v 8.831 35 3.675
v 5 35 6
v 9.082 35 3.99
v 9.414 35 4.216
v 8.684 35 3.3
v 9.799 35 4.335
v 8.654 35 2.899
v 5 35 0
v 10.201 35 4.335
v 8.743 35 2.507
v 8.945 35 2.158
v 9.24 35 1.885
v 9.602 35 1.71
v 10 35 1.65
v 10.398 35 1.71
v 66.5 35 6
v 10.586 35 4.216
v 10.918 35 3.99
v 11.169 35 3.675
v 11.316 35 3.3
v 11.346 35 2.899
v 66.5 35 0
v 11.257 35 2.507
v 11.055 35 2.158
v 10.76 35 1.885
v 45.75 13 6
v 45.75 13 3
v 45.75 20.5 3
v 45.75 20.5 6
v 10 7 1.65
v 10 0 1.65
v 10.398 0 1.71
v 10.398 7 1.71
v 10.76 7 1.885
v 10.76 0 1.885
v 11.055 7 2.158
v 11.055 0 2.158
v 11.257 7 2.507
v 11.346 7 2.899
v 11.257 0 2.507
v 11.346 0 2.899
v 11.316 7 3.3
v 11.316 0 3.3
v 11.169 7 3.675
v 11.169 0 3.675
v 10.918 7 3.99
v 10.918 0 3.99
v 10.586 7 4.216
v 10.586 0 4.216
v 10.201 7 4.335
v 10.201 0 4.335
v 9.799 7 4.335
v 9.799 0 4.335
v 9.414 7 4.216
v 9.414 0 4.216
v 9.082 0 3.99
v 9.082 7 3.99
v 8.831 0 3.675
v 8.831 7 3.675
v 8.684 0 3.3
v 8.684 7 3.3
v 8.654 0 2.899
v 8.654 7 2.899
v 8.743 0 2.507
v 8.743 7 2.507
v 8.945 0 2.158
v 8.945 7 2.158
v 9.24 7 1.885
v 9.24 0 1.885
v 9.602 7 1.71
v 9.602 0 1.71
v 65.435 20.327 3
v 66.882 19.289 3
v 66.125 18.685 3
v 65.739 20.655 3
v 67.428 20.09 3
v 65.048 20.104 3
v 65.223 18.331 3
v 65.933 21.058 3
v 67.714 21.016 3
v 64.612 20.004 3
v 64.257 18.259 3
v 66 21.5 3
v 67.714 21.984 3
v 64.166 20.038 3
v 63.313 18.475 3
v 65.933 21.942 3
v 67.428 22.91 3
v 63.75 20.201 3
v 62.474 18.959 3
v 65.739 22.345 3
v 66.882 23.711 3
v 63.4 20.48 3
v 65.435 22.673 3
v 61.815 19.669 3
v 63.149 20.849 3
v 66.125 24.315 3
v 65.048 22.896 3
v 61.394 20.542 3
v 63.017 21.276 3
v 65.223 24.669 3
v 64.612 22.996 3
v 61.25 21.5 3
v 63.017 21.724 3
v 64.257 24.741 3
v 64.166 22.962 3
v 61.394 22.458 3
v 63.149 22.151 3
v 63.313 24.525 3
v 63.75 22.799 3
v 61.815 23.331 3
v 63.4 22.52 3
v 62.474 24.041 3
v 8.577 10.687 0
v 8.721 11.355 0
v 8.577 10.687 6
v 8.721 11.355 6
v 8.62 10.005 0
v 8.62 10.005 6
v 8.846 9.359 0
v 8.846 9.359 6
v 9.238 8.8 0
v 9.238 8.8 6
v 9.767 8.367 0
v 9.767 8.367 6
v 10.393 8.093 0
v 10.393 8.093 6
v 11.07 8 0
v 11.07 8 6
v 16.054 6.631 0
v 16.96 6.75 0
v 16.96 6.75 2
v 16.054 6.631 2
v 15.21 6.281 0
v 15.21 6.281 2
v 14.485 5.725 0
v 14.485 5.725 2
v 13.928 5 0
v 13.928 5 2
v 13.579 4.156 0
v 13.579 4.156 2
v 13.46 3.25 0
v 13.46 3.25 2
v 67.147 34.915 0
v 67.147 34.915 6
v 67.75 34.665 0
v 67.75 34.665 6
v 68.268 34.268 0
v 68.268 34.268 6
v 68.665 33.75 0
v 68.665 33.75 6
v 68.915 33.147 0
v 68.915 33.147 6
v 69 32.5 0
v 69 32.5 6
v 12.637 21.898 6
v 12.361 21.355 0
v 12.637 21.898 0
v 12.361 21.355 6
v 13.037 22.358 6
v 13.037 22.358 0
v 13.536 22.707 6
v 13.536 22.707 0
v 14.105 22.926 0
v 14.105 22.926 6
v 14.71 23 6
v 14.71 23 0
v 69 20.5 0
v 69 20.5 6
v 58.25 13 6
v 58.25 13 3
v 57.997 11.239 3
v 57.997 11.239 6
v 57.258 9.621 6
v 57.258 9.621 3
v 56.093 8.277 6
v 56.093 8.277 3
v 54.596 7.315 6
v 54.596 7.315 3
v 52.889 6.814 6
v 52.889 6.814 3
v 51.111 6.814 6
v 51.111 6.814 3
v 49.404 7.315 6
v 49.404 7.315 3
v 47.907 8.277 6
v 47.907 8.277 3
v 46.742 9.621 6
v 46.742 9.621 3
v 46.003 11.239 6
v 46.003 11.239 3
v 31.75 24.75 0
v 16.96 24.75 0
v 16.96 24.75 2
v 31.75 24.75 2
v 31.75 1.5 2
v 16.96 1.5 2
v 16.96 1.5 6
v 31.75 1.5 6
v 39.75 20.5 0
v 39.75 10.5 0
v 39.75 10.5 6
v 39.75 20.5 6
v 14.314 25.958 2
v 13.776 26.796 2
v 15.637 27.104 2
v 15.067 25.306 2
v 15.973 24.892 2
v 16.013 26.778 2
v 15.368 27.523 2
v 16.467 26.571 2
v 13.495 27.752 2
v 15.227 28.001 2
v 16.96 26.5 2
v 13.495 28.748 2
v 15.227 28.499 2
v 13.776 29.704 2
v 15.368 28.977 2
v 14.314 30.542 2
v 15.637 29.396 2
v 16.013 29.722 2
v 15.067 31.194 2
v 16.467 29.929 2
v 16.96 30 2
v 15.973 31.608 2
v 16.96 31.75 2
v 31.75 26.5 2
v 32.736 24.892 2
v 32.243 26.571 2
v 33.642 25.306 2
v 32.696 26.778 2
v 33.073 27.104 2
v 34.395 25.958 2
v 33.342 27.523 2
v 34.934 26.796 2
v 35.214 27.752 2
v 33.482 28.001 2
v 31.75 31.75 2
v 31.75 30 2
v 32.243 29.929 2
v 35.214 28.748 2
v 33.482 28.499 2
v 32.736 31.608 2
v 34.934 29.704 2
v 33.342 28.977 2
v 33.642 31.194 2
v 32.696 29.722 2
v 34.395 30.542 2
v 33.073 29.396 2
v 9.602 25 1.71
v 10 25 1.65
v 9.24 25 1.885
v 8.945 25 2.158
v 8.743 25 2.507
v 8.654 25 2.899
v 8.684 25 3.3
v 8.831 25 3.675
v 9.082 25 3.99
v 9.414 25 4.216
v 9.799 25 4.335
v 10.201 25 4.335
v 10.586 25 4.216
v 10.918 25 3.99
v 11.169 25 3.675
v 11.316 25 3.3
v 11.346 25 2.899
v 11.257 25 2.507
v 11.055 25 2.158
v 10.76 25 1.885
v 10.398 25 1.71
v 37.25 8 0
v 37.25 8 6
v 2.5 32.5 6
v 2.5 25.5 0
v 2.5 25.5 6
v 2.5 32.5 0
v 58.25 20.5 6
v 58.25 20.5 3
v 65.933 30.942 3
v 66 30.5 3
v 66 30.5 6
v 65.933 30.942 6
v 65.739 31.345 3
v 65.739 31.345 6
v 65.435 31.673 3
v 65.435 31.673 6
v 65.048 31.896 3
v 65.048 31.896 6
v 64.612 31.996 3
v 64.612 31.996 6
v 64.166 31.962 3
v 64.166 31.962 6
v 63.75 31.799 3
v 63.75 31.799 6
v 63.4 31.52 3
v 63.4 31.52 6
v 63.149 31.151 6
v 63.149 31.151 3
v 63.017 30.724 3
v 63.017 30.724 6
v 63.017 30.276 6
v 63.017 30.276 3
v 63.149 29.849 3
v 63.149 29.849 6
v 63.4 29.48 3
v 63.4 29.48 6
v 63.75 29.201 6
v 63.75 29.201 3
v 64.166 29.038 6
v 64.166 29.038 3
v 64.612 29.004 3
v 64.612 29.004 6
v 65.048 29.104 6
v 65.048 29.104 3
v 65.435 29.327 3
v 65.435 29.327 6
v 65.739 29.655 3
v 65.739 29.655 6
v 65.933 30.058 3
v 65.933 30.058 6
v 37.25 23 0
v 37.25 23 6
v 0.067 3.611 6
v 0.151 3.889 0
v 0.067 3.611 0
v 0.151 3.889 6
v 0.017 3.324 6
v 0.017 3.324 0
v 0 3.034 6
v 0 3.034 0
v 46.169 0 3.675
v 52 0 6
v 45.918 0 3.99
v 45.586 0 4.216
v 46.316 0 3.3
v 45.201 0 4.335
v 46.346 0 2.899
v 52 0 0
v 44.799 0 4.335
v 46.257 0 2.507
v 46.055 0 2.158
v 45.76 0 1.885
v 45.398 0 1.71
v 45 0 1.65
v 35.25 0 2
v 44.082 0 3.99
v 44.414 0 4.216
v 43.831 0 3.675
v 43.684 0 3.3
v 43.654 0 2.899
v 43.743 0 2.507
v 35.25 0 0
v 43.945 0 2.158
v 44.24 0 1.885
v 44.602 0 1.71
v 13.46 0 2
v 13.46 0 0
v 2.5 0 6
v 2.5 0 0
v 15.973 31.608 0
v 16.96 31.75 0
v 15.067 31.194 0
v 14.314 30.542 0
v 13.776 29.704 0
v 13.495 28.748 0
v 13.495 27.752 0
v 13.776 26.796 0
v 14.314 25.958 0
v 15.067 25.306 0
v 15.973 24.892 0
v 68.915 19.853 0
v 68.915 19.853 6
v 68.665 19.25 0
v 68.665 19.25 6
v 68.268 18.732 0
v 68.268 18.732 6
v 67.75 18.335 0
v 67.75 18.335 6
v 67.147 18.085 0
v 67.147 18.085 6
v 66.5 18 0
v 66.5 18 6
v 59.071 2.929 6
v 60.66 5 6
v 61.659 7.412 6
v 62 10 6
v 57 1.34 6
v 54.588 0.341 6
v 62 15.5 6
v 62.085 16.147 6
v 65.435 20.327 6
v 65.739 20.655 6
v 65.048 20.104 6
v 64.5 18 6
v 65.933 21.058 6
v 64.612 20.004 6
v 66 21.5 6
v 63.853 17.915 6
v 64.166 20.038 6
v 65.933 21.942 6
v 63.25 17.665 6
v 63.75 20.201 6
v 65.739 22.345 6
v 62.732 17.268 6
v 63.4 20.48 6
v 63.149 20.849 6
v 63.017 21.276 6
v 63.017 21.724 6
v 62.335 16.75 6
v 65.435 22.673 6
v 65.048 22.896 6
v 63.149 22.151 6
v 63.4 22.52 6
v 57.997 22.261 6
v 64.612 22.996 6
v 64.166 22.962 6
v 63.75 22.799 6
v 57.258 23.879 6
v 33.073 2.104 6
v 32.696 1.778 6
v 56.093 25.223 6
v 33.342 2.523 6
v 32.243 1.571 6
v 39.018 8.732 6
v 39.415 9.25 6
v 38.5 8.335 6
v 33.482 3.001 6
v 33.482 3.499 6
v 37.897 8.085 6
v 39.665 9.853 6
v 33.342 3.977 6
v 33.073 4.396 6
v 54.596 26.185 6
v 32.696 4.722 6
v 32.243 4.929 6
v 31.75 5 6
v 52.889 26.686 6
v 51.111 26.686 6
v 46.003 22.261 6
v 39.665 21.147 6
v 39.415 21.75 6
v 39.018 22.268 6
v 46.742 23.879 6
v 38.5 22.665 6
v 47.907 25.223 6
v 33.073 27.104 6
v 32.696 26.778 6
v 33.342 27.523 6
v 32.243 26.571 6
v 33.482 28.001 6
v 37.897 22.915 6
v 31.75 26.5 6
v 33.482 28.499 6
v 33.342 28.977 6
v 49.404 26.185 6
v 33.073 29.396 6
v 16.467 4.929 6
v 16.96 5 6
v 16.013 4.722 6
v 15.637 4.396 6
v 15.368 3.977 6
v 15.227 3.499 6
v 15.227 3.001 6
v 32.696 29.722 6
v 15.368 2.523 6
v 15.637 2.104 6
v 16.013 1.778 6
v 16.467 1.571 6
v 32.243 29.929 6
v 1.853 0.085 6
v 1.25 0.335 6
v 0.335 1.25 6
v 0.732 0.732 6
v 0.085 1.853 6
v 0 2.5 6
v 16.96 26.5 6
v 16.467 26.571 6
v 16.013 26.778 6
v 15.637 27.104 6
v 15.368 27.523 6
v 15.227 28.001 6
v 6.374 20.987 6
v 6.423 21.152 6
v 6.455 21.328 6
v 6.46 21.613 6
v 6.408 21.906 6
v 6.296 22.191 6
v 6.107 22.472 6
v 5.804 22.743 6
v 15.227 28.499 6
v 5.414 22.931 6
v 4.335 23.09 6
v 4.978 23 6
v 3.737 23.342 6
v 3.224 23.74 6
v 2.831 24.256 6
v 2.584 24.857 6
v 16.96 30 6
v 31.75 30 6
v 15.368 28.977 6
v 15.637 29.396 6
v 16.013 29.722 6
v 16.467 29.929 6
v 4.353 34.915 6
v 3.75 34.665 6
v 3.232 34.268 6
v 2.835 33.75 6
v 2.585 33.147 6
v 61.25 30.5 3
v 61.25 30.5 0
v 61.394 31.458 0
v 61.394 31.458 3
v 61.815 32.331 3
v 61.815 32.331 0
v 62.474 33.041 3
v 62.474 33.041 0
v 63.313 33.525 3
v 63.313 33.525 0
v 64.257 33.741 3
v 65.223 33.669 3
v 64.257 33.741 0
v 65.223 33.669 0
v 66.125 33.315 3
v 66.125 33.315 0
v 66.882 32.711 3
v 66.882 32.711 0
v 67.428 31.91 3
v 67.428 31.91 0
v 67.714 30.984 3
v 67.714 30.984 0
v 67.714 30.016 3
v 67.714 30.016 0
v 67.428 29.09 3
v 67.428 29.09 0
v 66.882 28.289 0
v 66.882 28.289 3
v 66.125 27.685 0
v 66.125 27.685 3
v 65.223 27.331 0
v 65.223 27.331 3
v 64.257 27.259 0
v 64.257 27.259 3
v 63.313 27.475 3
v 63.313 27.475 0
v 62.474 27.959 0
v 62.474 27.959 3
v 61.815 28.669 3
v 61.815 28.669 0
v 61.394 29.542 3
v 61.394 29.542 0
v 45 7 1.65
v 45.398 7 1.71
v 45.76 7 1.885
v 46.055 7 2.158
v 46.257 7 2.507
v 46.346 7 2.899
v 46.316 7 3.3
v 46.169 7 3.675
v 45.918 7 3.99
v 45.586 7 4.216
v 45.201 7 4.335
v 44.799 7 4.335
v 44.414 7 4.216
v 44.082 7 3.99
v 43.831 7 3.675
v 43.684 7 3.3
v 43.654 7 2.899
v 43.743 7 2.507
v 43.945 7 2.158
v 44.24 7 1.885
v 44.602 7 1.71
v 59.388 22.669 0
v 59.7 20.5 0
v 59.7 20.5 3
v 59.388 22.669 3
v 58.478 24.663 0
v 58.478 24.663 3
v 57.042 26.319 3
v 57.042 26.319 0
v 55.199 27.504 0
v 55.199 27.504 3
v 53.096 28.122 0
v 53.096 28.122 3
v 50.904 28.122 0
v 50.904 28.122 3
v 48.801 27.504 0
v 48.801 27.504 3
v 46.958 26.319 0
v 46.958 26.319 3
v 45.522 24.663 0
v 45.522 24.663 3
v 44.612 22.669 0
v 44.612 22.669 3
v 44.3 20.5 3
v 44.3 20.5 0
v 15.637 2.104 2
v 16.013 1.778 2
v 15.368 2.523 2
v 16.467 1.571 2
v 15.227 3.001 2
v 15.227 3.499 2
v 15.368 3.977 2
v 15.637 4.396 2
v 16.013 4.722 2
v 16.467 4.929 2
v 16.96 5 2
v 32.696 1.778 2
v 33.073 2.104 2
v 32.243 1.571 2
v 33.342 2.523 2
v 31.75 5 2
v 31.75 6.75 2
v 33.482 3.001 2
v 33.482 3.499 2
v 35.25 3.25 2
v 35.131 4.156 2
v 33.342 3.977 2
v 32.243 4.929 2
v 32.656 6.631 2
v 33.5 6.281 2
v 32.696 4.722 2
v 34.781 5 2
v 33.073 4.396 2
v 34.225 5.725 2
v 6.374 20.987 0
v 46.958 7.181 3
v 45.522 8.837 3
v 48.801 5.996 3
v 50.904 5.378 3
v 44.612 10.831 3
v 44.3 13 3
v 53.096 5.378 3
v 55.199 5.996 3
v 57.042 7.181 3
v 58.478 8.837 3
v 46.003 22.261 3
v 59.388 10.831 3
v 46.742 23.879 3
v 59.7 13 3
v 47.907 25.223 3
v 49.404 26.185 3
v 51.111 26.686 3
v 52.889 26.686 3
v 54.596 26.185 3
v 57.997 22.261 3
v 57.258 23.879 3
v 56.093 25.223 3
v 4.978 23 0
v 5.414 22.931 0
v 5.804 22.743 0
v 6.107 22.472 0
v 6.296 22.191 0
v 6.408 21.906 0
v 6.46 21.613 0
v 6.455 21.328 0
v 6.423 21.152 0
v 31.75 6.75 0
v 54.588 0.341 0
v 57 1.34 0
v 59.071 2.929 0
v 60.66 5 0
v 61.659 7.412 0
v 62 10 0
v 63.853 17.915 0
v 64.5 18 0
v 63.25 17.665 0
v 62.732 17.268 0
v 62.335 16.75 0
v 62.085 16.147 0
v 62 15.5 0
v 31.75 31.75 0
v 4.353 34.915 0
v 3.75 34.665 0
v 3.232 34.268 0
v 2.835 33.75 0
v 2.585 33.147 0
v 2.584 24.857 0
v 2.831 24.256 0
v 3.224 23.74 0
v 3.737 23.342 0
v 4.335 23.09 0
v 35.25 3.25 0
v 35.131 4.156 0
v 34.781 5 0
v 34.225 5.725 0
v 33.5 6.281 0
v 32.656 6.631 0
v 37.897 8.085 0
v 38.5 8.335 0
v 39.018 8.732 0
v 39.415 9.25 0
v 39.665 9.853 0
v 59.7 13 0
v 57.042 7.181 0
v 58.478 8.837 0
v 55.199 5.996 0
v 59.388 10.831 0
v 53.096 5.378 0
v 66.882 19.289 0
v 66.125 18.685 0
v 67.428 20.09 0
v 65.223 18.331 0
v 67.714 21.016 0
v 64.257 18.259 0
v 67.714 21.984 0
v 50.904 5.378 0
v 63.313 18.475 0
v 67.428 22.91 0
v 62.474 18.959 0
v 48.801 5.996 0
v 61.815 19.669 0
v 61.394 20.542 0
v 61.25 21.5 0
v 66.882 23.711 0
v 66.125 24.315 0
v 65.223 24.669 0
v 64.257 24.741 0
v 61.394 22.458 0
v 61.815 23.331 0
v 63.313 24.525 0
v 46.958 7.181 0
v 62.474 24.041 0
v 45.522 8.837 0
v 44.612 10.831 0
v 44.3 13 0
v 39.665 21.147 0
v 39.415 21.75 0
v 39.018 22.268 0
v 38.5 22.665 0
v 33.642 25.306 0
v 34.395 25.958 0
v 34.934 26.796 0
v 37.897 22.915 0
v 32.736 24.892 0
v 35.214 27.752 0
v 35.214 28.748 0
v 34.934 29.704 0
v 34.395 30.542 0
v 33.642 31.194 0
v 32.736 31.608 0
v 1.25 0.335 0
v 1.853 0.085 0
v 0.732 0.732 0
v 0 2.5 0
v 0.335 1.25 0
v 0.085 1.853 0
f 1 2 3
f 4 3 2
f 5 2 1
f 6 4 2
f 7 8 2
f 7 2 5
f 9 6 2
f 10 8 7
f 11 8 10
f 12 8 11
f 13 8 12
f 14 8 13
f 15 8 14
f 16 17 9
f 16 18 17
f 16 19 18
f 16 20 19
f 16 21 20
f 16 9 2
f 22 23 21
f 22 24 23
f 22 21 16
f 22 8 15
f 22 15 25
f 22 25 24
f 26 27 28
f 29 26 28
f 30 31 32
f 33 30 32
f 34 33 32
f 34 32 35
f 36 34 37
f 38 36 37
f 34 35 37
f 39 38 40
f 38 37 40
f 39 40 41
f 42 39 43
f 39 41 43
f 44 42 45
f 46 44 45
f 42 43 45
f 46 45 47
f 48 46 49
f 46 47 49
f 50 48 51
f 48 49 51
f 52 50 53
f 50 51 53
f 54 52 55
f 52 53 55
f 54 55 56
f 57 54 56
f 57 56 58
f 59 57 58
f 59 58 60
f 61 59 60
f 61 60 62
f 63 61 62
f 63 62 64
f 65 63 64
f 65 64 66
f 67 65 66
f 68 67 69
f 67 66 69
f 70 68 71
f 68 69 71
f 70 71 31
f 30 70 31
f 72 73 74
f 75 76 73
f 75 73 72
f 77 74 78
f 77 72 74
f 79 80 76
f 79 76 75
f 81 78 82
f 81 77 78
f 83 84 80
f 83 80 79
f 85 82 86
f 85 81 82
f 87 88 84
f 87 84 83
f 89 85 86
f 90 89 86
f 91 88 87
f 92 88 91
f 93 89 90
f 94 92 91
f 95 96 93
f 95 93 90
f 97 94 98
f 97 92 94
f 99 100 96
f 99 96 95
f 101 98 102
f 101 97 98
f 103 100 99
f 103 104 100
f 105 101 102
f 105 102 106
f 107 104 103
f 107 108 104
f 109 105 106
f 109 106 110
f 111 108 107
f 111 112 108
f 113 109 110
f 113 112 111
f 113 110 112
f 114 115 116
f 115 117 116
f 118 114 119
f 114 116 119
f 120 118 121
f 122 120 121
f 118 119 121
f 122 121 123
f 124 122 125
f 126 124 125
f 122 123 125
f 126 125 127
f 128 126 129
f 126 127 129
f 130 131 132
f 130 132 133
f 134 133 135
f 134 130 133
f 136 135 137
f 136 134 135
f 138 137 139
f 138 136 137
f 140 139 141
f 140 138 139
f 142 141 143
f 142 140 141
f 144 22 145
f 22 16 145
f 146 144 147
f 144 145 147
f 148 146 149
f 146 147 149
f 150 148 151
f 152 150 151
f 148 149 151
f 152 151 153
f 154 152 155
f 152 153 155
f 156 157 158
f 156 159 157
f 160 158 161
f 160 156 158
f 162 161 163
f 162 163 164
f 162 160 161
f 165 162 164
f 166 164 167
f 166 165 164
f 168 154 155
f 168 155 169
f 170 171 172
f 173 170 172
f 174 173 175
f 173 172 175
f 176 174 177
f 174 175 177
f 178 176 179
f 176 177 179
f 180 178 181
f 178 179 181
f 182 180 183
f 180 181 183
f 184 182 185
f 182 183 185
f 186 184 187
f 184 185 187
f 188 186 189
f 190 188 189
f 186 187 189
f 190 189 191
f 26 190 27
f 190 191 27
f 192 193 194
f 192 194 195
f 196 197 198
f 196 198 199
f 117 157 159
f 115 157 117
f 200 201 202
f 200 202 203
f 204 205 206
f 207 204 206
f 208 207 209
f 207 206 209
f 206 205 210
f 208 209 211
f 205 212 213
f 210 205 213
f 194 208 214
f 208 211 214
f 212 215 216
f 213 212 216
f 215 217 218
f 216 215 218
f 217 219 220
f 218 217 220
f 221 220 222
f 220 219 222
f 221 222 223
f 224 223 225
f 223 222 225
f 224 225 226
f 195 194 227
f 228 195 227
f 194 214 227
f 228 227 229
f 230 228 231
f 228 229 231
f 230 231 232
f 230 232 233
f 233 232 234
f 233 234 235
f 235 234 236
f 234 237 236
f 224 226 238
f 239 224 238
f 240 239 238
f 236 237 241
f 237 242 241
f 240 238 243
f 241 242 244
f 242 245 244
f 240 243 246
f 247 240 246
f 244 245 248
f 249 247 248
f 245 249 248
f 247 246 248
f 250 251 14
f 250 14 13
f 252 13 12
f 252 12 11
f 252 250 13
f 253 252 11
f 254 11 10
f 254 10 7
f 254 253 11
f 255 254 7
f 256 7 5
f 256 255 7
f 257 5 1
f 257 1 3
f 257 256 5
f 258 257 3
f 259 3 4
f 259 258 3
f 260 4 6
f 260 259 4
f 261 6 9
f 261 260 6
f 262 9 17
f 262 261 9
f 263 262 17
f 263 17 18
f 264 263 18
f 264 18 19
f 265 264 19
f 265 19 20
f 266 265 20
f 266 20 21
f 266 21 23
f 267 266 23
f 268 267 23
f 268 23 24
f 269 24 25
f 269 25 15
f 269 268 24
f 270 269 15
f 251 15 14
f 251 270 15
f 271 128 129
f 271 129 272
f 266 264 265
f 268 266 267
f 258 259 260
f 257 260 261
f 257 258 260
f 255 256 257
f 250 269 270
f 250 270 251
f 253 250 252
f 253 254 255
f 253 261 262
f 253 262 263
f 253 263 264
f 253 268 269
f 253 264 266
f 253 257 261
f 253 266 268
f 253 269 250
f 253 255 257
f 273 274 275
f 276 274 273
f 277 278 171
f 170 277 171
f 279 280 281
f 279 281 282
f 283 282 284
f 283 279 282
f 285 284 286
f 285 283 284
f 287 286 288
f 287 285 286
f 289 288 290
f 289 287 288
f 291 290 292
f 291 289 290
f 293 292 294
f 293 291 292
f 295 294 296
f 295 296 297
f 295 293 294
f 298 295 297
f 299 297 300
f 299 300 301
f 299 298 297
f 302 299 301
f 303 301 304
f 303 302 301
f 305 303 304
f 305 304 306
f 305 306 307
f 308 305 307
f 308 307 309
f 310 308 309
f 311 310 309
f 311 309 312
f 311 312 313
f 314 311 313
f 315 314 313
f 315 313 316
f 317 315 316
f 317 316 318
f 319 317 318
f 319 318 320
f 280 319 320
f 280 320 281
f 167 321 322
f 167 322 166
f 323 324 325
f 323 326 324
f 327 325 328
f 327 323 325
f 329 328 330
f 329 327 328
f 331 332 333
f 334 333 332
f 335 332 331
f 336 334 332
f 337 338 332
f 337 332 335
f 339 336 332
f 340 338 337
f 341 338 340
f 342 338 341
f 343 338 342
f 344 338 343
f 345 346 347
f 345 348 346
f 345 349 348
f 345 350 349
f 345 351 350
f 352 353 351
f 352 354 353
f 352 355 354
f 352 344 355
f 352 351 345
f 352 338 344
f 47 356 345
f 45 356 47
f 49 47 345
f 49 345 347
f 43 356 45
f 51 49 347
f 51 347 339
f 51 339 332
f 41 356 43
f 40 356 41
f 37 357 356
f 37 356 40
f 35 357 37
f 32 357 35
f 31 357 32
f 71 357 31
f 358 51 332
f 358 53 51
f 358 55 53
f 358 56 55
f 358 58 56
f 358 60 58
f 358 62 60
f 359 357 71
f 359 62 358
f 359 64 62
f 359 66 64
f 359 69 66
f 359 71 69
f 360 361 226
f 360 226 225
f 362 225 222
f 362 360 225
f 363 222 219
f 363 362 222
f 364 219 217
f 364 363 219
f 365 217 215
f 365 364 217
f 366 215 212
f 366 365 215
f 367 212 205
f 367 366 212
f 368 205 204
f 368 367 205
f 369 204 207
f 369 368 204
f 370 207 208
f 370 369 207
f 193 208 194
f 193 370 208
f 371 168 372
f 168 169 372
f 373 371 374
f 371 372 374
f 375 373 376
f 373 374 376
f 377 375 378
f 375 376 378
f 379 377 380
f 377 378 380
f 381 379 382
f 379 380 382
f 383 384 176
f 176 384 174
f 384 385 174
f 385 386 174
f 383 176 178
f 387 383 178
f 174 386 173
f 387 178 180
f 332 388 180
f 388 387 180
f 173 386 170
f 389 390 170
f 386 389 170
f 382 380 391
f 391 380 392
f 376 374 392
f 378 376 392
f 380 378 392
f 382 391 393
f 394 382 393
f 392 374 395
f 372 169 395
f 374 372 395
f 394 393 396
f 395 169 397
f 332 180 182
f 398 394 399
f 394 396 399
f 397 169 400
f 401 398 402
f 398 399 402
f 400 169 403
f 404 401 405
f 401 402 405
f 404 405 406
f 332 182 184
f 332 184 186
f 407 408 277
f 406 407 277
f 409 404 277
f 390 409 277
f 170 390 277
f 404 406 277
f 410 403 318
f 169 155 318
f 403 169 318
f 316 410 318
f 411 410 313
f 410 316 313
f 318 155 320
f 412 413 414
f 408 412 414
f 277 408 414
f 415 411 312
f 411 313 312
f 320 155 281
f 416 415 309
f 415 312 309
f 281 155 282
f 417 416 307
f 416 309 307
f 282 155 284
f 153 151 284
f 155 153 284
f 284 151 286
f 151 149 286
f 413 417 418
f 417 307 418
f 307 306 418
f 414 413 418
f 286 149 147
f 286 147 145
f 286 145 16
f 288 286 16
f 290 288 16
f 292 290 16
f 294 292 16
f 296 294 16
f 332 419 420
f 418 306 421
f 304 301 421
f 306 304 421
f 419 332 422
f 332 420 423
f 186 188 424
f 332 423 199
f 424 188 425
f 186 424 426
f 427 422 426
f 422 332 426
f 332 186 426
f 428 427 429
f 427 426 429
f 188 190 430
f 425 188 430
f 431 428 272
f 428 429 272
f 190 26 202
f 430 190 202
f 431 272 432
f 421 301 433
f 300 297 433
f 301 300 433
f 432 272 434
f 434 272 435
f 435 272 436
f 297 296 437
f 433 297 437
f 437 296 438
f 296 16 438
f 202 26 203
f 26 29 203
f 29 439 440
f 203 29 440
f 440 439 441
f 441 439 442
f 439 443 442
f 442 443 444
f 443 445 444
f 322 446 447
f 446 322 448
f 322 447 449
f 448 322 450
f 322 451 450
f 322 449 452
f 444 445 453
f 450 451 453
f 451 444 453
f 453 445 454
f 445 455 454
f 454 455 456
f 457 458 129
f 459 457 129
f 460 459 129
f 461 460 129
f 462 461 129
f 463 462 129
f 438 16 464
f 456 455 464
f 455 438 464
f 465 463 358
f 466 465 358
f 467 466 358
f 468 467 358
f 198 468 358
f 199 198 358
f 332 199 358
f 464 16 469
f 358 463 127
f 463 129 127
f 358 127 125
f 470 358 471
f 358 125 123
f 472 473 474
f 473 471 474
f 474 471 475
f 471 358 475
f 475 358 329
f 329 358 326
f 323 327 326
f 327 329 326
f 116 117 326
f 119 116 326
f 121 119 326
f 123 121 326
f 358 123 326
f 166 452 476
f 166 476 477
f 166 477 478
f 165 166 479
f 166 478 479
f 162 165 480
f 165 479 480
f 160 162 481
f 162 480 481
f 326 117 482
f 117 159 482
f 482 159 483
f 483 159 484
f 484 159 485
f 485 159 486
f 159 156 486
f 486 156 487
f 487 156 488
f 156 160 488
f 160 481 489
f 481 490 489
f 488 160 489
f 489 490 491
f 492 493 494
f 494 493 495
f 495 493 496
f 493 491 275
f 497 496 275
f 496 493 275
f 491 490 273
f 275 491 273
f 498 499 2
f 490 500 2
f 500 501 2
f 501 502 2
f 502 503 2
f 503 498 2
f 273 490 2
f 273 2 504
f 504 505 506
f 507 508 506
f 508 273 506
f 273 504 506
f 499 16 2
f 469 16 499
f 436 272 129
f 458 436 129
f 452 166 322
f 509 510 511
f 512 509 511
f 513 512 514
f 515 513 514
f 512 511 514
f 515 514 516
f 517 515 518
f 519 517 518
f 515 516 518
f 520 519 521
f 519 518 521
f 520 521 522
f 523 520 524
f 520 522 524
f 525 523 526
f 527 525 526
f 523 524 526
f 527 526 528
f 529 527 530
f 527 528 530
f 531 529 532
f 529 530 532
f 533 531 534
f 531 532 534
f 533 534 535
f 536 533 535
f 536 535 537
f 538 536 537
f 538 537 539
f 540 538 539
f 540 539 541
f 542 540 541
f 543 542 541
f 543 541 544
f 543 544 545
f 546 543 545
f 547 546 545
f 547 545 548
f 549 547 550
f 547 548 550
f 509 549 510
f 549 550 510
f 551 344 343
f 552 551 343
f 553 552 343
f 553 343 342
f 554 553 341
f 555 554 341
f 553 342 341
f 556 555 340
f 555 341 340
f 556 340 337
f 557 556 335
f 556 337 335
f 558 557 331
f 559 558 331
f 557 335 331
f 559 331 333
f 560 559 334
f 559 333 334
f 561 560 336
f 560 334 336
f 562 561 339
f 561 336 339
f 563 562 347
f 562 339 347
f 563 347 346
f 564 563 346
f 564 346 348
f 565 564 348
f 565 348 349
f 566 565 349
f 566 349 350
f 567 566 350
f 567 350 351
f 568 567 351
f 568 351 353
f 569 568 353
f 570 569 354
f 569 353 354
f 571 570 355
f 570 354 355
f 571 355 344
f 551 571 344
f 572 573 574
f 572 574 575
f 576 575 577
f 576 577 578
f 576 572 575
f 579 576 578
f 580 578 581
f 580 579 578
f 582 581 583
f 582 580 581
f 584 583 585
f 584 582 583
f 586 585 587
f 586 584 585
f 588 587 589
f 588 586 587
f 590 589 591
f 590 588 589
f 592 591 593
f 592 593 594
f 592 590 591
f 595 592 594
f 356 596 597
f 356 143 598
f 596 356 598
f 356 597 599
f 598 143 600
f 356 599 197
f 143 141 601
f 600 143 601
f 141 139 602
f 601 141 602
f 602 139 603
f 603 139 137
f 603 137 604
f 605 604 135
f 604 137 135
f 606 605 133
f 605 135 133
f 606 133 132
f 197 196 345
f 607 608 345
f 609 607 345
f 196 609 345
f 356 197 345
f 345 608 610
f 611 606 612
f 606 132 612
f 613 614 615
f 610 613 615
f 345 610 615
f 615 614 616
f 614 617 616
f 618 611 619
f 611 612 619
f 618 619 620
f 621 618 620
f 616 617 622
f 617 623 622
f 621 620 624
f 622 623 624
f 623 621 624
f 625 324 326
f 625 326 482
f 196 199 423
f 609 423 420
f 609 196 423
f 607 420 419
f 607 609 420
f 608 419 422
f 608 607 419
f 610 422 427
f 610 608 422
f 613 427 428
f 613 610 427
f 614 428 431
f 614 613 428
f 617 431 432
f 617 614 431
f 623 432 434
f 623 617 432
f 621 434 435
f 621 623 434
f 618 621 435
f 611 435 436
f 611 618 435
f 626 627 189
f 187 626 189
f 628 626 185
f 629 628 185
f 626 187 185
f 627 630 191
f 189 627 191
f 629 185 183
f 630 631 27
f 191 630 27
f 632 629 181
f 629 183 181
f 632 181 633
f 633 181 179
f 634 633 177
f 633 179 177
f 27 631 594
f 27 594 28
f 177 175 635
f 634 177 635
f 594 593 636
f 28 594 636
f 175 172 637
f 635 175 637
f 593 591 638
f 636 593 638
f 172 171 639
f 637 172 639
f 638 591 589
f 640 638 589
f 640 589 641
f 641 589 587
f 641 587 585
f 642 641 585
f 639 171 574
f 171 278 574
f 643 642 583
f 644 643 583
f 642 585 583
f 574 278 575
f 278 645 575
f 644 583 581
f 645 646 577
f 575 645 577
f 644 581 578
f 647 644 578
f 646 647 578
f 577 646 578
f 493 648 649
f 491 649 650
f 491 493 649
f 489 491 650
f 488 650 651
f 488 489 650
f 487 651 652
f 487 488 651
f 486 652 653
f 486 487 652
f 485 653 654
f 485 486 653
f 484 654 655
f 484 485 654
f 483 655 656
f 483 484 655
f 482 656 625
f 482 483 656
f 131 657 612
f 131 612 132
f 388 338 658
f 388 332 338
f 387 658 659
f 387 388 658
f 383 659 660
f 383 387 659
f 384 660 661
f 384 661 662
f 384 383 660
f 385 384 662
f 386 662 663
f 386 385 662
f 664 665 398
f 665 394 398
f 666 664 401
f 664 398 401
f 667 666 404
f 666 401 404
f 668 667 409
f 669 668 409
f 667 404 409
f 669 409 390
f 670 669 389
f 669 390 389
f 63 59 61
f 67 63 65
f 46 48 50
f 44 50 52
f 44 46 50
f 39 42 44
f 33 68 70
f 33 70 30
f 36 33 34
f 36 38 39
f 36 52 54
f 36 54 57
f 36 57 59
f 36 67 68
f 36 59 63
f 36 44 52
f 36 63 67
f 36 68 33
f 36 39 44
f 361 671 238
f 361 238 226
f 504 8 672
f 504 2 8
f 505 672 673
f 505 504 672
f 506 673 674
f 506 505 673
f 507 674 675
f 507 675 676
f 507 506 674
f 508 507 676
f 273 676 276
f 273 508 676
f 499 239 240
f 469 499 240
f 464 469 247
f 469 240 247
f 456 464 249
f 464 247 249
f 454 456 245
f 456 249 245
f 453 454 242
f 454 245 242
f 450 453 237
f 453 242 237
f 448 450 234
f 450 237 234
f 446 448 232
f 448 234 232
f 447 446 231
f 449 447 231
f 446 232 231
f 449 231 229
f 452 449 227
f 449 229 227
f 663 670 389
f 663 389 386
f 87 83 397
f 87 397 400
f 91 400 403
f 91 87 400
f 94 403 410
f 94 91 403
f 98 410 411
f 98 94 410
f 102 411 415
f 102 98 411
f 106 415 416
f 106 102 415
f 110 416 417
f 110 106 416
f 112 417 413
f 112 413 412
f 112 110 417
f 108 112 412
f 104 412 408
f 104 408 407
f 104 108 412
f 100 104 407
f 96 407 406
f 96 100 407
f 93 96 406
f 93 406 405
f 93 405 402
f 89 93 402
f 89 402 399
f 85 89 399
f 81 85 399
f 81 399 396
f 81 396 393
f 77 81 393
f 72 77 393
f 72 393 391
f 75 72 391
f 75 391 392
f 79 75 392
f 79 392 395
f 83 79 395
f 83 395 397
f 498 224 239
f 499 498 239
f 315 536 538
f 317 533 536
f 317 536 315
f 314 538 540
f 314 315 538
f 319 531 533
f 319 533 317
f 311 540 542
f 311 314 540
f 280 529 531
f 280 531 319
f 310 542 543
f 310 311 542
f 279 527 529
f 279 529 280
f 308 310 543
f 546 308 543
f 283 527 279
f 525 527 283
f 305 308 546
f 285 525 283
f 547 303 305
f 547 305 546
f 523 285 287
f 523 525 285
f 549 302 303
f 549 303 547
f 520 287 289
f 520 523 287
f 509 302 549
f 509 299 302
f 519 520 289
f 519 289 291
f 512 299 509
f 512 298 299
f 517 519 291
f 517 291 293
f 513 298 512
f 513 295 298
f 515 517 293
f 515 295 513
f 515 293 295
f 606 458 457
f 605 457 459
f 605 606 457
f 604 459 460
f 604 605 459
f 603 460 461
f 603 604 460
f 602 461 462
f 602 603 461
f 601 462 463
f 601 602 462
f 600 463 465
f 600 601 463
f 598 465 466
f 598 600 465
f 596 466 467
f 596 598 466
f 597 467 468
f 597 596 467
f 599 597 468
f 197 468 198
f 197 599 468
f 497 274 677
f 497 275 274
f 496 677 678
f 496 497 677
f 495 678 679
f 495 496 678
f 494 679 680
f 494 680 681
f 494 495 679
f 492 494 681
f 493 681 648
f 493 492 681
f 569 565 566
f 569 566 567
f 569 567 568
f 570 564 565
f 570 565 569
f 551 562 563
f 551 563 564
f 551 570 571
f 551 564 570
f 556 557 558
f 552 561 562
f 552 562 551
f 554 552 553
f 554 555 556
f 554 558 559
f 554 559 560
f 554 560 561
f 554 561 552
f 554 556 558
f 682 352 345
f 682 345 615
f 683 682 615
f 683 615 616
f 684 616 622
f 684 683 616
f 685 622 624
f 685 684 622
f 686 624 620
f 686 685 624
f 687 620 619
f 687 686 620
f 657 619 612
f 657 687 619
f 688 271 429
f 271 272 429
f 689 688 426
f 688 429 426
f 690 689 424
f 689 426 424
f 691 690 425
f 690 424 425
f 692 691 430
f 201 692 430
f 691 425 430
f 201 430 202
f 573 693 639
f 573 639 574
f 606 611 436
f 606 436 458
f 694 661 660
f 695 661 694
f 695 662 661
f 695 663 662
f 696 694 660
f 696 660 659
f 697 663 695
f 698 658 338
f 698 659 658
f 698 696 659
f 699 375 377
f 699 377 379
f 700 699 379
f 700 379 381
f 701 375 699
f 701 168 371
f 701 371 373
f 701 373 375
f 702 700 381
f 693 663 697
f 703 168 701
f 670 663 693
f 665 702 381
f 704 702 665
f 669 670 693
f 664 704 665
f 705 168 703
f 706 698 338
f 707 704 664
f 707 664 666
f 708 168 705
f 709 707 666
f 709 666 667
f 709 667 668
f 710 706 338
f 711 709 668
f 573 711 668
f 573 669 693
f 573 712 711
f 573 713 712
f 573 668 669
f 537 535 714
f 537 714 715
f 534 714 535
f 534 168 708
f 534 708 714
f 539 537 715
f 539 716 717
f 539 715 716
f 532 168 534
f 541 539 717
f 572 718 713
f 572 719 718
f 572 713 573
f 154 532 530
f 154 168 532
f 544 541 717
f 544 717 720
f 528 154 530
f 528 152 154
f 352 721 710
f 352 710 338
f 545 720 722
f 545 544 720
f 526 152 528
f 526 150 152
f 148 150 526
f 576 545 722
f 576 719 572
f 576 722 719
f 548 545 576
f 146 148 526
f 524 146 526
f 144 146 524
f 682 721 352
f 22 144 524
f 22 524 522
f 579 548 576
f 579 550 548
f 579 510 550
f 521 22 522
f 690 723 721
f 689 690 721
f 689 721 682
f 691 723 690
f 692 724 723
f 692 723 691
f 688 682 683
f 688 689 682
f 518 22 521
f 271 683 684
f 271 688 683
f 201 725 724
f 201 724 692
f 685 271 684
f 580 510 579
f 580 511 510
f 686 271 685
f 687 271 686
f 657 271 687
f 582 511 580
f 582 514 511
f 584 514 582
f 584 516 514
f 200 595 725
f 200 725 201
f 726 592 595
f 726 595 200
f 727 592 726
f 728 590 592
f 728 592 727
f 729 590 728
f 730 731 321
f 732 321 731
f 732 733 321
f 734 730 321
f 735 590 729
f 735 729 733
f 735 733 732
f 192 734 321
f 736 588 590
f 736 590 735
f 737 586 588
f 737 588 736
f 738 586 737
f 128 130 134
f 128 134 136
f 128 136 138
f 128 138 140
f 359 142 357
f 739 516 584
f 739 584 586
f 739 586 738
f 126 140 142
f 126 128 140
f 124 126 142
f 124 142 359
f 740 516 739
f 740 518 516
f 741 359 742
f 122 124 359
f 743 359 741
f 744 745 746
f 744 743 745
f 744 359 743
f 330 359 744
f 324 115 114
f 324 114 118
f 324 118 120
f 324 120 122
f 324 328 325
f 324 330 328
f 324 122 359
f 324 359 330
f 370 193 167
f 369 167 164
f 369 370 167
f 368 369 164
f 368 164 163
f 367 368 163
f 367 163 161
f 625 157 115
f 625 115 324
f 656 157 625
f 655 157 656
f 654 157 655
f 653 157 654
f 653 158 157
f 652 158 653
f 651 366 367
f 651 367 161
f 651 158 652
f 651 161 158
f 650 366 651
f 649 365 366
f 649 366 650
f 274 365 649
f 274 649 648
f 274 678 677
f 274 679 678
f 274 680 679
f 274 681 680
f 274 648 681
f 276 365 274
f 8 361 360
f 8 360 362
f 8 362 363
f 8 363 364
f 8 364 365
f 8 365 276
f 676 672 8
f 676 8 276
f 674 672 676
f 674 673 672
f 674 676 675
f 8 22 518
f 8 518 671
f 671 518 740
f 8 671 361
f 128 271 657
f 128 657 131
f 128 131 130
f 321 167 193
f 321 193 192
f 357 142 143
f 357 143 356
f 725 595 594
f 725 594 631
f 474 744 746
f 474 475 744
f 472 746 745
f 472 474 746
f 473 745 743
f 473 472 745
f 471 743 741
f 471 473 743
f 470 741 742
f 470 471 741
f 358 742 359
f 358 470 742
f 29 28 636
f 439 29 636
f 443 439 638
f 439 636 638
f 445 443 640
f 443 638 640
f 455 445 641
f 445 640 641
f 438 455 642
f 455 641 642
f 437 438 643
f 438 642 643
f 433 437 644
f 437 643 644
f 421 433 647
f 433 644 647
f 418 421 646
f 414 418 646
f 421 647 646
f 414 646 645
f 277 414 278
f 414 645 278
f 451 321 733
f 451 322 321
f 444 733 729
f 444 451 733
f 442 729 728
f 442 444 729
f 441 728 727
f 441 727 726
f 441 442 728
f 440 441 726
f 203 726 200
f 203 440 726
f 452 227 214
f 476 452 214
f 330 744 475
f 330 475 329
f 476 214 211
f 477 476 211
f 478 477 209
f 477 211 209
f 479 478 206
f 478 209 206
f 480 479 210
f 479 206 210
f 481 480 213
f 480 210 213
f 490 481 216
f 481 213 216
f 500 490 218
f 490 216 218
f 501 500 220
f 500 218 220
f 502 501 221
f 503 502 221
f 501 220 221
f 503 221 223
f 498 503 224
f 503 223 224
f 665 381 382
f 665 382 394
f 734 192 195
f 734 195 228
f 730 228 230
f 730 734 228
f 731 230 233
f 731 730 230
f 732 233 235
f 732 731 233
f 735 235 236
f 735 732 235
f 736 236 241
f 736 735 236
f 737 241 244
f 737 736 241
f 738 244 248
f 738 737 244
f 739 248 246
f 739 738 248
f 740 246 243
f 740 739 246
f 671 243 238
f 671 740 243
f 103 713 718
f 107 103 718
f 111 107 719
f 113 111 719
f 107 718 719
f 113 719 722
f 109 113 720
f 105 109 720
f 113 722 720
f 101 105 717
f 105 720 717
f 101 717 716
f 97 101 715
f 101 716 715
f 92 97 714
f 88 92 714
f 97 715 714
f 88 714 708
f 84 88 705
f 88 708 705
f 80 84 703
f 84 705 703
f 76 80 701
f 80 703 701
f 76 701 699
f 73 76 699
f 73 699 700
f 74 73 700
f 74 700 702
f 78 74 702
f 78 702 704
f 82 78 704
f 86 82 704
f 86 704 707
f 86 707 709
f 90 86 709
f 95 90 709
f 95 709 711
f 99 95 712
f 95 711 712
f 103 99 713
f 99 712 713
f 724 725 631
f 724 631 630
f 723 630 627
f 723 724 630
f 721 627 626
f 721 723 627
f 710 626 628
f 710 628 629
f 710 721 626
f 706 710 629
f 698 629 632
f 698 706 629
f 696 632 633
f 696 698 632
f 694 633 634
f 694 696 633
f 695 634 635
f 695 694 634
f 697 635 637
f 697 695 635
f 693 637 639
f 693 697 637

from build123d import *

# Parameters (mm, degrees)
SKETCH1_R           = 1.5
BOSS_EXTRUDE1_DEPTH = 6
SKETCH2_R           = 3.25
CUT_EXTRUDE1_DEPTH  = 3
FILLET1_R           = 2.5
FILLET2_R           = 1.5
FILLET3_R           = 10
CUT_EXTRUDE2_DEPTH  = 2
SKETCH4_R           = 1.35
CUT_EXTRUDE3_DEPTH  = 7
CUT_EXTRUDE4_START  = -10
SKETCH5_R           = 1.35
CUT_EXTRUDE4_DEPTH  = 10


with BuildPart() as part:
    # Sketch1 → Boss-Extrude1 (new body)
    with BuildSketch(Plane.XY):
        Polygon((2.5, 35), (69, 35), (69, 18), (62, 18), (62, 0), (0, 0), (0, 3.474843555), (7.106575765, 23), (2.5, 23), align=None)
        with Locations((64.5, 30.5)):
            Circle(SKETCH1_R, mode=Mode.SUBTRACT)
        with Locations((64.5, 21.5)):
            Circle(SKETCH1_R, mode=Mode.SUBTRACT)
        with BuildLine():
            Line((58.25, 20.5), (58.25, 13))
            ThreePointArc((58.25, 13), (52, 6.75), (45.75, 13))
            Line((45.75, 13), (45.75, 20.5))
            ThreePointArc((45.75, 20.5), (52, 26.75), (58.25, 20.5))
        make_face(mode=Mode.SUBTRACT)
        Polygon((7.5, 8), (39.75, 8), (39.75, 23), (12.959553514, 23), align=None, mode=Mode.SUBTRACT)
        with BuildLine():
            Line((16.959553514, 30), (31.75, 30))
            ThreePointArc((31.75, 30), (33.5, 28.25), (31.75, 26.5))
            Line((31.75, 26.5), (16.959553514, 26.5))
            ThreePointArc((16.959553514, 26.5), (15.209553514, 28.25), (16.959553514, 30))
        make_face(mode=Mode.SUBTRACT)
        with BuildLine():
            Line((16.959553514, 1.5), (31.75, 1.5))
            ThreePointArc((31.75, 1.5), (33.5, 3.25), (31.75, 5))
            Line((31.75, 5), (16.959553514, 5))
            ThreePointArc((16.959553514, 5), (15.209553514, 3.25), (16.959553514, 1.5))
        make_face(mode=Mode.SUBTRACT)
    extrude(amount=BOSS_EXTRUDE1_DEPTH)

    # Sketch2 → Cut-Extrude1 (cut)
    with BuildSketch(Plane(origin=(0, 0, 0), x_dir=(-1, 0, 0), z_dir=(0, 0, -1))):
        with Locations((-64.5, 30.5)):
            Circle(SKETCH2_R)
        with Locations((-64.5, 21.5)):
            Circle(SKETCH2_R)
        with BuildLine():
            Line((-44.3, 20.5), (-44.3, 13))
            ThreePointArc((-44.3, 13), (-52, 5.3), (-59.7, 13))
            Line((-59.7, 13), (-59.7, 20.5))
            ThreePointArc((-59.7, 20.5), (-52, 28.2), (-44.3, 20.5))
        make_face()
    extrude(amount=-CUT_EXTRUDE1_DEPTH, mode=Mode.SUBTRACT)

    # Fillet1
    fillet1_edges = [part.edges().sort_by_distance(p)[0] for p in [
        (0, 0, 3),
        (0, 3.474843555, 3),
        (2.5, 23, 3),
        (2.5, 35, 3),
        (69, 35, 3),
        (69, 18, 3),
        (62, 18, 3),
        (12.959553514, 23, 3),
        (7.5, 8, 3),
        (39.75, 8, 3),
        (39.75, 23, 3),
    ]]
    fillet(fillet1_edges, radius=FILLET1_R)

    # Fillet2
    fillet2_edges = [part.edges().sort_by_distance(p)[0] for p in [
        (7.106575765, 23, 3),
    ]]
    fillet(fillet2_edges, radius=FILLET2_R)

    # Fillet3
    fillet3_edges = [part.edges().sort_by_distance(p)[0] for p in [
        (62, 0, 3),
    ]]
    fillet(fillet3_edges, radius=FILLET3_R)

    # Sketch3 → Cut-Extrude2 (cut)
    with BuildSketch(Plane(origin=(0, 0, 0), x_dir=(-1, 0, 0), z_dir=(0, 0, -1))):
        with BuildLine():
            Line((-31.75, 31.75), (-16.959553514, 31.75))
            ThreePointArc((-16.959553514, 31.75), (-13.459553514, 28.25), (-16.959553514, 24.75))
            Line((-16.959553514, 24.75), (-31.75, 24.75))
            ThreePointArc((-31.75, 24.75), (-35.25, 28.25), (-31.75, 31.75))
        make_face()
        with BuildLine():
            Line((-31.75, 6.75), (-16.959553514, 6.75))
            ThreePointArc((-16.959553514, 6.75), (-14.48467978, 5.724873734), (-13.459553514, 3.25))
            Line((-13.459553514, 3.25), (-13.459553514, 0))
            Line((-13.459553514, 0), (-35.25, 0))
            Line((-35.25, 0), (-35.25, 3.25))
            ThreePointArc((-35.25, 3.25), (-34.224873734, 5.724873734), (-31.75, 6.75))
        make_face()
    extrude(amount=-CUT_EXTRUDE2_DEPTH, mode=Mode.SUBTRACT)

    # Sketch4 → Cut-Extrude3 (cut)
    with BuildSketch(Plane.XZ):
        with Locations(Location((10, 3, 0), (0, 0, 270))):
            Circle(SKETCH4_R)
        with Locations(Location((45, 3, 0), (0, 0, 270))):
            Circle(SKETCH4_R)
    extrude(amount=-CUT_EXTRUDE3_DEPTH, mode=Mode.SUBTRACT)

    # Sketch5 → Cut-Extrude4 (cut)
    with BuildSketch(Plane(origin=(0, 35, 0), x_dir=(1, 0, 0), z_dir=(0, 1, 0)).offset(CUT_EXTRUDE4_START)):
        with Locations(Location((10, -3, 0), (0, 0, 90))):
            Circle(SKETCH5_R)
    extrude(amount=CUT_EXTRUDE4_DEPTH, mode=Mode.SUBTRACT)


solid = part.part
